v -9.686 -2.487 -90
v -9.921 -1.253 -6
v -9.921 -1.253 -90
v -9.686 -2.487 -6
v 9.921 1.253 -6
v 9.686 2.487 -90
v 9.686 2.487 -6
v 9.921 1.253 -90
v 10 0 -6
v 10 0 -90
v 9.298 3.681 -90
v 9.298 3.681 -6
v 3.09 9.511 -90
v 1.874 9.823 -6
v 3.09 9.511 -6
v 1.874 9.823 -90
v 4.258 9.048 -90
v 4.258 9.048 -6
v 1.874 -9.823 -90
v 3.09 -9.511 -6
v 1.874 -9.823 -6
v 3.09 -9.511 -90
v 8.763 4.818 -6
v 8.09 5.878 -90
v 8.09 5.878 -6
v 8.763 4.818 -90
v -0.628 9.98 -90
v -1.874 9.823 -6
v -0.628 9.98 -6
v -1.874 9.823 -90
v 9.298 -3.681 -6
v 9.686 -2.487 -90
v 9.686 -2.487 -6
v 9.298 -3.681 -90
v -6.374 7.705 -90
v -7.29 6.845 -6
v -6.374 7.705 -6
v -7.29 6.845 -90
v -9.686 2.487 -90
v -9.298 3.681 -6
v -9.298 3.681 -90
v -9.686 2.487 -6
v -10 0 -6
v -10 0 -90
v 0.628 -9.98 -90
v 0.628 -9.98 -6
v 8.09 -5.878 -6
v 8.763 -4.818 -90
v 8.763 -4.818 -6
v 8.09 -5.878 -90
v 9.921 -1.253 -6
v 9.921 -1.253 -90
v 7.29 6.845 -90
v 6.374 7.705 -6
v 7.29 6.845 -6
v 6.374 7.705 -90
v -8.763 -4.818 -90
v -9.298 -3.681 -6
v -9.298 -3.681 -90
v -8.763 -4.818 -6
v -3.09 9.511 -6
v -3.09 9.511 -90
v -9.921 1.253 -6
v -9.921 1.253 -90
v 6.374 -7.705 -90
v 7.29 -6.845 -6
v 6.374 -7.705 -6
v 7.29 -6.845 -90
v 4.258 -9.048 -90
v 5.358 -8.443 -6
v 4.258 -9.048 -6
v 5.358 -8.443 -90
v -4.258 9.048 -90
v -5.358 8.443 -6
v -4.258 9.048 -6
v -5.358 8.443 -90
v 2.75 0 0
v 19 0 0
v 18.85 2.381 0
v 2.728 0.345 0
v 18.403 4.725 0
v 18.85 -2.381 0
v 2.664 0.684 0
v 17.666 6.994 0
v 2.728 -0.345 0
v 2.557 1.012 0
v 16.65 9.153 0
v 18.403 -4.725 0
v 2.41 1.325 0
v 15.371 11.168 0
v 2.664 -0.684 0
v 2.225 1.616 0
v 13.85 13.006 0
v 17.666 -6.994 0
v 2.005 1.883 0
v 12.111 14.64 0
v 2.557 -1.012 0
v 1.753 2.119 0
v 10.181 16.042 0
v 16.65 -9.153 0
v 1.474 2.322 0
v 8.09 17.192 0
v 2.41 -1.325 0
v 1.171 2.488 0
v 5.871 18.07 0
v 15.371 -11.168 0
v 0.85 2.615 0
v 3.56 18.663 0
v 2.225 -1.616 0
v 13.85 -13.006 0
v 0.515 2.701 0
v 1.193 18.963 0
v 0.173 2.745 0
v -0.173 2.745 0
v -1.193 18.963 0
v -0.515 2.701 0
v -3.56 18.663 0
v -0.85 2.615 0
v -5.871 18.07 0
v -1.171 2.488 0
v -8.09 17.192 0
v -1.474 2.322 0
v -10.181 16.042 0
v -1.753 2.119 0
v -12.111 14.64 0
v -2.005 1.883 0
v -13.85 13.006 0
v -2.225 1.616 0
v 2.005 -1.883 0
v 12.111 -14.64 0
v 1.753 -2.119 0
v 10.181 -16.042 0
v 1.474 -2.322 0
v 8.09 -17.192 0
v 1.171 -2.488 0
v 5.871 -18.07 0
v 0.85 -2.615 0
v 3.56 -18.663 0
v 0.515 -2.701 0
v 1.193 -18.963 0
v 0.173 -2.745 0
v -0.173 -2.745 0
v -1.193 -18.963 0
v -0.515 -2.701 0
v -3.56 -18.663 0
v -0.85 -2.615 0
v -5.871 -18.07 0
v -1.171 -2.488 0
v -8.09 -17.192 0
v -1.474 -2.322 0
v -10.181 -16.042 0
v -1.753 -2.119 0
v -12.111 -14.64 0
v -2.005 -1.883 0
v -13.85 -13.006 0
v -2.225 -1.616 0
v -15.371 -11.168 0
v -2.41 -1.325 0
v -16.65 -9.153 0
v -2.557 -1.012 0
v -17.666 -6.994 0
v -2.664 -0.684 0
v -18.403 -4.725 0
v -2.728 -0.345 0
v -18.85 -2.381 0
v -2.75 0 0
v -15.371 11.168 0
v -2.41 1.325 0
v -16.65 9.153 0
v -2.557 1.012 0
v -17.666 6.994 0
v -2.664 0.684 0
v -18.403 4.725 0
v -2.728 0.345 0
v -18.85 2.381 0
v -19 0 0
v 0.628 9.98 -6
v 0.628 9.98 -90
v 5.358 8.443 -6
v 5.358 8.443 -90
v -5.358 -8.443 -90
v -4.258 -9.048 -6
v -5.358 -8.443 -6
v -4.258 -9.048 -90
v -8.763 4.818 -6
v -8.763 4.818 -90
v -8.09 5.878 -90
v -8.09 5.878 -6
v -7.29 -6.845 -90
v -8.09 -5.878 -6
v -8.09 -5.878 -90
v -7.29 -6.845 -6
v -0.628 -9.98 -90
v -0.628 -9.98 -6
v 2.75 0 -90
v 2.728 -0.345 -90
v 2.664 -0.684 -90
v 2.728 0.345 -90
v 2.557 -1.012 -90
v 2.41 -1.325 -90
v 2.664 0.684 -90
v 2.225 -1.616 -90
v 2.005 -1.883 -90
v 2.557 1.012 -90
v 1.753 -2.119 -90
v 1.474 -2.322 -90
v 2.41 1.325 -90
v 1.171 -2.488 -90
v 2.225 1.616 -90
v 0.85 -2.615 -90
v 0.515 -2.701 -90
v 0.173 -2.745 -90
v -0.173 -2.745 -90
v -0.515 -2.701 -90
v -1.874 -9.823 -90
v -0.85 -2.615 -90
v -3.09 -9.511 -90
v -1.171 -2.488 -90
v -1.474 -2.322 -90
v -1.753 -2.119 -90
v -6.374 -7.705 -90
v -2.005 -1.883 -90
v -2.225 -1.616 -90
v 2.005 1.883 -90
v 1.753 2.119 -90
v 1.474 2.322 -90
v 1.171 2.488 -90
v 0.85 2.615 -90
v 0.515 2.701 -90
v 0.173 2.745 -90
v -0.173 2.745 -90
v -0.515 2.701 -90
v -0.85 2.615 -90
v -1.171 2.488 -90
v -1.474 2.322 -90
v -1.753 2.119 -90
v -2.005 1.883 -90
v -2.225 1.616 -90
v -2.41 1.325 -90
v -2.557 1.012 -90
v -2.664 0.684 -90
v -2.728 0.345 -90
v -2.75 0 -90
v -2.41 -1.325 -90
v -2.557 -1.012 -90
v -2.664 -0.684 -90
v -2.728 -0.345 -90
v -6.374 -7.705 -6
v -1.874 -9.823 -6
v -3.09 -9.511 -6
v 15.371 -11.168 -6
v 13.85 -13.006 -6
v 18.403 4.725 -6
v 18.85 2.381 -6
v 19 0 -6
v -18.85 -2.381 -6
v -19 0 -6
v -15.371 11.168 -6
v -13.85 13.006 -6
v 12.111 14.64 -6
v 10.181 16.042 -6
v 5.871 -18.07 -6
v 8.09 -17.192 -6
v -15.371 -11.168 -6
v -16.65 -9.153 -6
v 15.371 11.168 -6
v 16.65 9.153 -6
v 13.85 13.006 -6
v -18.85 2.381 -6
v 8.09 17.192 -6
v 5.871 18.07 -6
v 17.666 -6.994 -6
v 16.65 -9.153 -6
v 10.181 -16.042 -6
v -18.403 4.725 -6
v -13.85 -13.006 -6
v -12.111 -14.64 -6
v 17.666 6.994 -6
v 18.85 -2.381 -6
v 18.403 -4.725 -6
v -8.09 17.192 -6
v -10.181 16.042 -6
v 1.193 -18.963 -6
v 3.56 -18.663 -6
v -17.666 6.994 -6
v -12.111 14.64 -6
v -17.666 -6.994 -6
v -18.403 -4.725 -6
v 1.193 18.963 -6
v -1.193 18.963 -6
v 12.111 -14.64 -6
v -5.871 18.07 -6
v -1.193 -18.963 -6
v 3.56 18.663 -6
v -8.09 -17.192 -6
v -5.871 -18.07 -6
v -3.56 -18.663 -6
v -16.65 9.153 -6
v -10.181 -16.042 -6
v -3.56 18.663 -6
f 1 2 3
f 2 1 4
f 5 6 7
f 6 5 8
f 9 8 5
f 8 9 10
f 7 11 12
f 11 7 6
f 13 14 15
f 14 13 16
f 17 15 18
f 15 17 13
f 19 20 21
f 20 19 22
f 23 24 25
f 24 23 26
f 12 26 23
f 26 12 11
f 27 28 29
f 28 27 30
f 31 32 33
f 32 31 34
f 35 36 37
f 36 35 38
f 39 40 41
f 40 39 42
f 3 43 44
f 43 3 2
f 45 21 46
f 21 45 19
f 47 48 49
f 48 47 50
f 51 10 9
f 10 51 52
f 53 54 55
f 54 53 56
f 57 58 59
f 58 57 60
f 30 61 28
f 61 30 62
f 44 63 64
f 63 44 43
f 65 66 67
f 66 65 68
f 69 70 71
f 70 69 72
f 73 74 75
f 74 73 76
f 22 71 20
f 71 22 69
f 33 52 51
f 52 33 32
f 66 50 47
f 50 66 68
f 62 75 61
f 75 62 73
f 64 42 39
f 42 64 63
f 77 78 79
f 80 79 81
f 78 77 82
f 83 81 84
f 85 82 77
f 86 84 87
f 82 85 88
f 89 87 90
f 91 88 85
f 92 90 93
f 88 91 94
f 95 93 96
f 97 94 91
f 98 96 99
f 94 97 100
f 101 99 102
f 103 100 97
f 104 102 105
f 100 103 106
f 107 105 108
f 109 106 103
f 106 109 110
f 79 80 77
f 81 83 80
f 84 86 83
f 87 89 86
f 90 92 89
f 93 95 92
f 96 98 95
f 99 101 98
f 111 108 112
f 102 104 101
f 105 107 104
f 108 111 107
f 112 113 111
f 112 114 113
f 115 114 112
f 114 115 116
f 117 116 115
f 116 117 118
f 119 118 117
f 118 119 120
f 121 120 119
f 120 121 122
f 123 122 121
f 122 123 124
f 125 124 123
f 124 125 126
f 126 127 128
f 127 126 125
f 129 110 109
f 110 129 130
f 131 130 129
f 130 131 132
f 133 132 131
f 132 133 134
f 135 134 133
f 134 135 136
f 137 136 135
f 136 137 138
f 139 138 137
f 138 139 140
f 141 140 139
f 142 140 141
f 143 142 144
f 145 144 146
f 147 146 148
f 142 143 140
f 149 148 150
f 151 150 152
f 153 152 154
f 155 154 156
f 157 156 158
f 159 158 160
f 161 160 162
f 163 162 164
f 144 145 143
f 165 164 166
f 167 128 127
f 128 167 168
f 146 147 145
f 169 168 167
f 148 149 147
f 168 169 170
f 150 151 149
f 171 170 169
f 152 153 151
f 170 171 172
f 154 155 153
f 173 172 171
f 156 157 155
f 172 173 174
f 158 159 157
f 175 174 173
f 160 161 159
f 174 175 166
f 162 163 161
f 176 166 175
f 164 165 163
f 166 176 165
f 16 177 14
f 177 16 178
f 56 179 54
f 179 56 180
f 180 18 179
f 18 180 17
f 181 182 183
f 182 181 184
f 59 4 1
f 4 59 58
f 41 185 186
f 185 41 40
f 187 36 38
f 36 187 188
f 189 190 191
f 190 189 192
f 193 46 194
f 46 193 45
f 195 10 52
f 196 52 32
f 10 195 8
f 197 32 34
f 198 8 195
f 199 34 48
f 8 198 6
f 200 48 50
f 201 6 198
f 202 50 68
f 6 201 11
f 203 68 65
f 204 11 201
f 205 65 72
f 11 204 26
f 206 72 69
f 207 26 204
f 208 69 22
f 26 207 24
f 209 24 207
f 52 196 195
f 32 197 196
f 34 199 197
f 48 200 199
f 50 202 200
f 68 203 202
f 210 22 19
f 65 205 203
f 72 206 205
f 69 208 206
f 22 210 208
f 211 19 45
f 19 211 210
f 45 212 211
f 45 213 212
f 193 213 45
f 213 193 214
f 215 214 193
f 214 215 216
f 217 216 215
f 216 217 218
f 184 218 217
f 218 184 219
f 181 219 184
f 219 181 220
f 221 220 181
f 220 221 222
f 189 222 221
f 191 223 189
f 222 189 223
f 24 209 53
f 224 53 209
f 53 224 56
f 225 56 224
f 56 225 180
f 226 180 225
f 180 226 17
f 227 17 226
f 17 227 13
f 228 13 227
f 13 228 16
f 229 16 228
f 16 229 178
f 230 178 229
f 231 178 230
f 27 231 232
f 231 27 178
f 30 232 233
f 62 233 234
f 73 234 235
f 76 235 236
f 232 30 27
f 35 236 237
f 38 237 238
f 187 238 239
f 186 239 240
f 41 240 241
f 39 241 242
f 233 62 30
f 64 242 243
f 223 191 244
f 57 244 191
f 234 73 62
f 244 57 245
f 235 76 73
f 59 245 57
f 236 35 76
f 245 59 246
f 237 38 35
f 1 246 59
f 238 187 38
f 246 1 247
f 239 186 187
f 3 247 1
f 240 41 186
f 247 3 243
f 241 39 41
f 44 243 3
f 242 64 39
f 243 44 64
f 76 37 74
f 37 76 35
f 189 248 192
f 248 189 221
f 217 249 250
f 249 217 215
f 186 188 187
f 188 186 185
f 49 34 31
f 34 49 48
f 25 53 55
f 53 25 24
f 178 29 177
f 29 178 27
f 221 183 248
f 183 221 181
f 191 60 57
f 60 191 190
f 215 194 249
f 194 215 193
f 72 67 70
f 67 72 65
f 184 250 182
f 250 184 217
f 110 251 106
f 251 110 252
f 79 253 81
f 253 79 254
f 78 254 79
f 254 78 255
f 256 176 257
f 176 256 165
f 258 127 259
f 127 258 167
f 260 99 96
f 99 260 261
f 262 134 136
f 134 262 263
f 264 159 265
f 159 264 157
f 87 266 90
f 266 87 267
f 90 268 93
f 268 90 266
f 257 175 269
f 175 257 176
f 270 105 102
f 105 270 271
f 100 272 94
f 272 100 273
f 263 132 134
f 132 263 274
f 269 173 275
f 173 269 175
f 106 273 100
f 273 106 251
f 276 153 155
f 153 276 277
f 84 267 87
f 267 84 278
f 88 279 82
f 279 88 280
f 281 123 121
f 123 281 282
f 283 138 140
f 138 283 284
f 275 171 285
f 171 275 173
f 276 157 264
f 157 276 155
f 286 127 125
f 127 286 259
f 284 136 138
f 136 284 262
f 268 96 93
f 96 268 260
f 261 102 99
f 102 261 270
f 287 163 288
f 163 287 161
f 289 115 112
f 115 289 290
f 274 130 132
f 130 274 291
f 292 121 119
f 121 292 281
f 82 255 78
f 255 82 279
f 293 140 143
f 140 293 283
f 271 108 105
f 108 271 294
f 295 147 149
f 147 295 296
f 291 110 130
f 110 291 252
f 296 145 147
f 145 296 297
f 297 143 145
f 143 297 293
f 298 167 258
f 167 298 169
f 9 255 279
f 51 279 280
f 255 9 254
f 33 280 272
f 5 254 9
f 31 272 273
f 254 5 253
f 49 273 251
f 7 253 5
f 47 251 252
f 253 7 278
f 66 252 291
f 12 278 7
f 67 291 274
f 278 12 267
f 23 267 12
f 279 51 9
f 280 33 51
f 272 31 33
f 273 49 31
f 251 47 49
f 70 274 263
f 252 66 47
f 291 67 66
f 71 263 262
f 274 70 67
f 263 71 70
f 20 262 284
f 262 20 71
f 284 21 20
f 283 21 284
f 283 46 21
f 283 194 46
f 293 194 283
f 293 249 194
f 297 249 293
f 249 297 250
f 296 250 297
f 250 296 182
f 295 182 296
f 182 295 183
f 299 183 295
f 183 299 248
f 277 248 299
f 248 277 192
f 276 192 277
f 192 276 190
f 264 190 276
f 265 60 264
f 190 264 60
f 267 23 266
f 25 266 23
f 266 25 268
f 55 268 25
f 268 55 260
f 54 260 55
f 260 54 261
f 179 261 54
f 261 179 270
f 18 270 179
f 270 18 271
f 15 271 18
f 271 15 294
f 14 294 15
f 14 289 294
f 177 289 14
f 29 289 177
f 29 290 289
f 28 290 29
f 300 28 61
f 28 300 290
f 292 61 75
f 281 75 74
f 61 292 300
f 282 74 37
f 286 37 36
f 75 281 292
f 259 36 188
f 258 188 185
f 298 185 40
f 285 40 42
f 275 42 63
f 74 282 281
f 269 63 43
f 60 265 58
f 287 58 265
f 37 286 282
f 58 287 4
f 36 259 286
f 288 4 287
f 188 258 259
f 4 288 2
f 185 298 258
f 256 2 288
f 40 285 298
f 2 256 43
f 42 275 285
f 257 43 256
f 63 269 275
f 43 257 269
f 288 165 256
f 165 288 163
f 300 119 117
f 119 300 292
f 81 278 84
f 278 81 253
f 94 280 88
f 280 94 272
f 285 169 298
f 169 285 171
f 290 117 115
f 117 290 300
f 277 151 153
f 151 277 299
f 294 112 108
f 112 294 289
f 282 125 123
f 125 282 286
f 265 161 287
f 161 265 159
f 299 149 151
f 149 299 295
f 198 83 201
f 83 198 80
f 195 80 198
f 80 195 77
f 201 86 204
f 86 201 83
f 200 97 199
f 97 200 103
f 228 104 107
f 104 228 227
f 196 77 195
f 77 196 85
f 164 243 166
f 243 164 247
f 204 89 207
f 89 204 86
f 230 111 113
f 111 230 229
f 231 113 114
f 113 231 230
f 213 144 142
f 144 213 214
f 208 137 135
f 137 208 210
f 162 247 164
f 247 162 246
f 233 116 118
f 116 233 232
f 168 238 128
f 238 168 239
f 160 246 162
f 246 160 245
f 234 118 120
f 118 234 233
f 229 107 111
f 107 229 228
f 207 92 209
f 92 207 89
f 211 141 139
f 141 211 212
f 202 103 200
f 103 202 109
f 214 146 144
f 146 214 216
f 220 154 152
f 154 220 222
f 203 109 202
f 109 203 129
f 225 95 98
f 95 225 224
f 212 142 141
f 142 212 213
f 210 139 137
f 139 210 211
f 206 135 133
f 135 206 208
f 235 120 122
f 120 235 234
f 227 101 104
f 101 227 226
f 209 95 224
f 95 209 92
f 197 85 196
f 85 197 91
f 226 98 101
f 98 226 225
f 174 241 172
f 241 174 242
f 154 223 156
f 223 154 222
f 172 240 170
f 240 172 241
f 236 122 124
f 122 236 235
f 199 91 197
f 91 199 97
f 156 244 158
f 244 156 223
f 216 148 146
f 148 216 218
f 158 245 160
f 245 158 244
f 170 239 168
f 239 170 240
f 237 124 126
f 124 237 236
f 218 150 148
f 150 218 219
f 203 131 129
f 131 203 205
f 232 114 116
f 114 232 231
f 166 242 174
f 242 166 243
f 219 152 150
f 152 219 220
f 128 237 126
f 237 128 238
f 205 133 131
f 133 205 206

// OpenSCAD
$fn = 50;


difference() {
	union() {
		translate(v = [0, 0, -90.0000000000]) {
			cylinder(h = 90, r = 10.0000000000);
		}
		translate(v = [0, 0, -6.0000000000]) {
			cylinder(h = 6, r = 19.0000000000);
		}
	}
	union() {
		#translate(v = [0, 0, -90]) {
			cylinder(h = 90, r = 2.7500000000);
		}
	}
}
